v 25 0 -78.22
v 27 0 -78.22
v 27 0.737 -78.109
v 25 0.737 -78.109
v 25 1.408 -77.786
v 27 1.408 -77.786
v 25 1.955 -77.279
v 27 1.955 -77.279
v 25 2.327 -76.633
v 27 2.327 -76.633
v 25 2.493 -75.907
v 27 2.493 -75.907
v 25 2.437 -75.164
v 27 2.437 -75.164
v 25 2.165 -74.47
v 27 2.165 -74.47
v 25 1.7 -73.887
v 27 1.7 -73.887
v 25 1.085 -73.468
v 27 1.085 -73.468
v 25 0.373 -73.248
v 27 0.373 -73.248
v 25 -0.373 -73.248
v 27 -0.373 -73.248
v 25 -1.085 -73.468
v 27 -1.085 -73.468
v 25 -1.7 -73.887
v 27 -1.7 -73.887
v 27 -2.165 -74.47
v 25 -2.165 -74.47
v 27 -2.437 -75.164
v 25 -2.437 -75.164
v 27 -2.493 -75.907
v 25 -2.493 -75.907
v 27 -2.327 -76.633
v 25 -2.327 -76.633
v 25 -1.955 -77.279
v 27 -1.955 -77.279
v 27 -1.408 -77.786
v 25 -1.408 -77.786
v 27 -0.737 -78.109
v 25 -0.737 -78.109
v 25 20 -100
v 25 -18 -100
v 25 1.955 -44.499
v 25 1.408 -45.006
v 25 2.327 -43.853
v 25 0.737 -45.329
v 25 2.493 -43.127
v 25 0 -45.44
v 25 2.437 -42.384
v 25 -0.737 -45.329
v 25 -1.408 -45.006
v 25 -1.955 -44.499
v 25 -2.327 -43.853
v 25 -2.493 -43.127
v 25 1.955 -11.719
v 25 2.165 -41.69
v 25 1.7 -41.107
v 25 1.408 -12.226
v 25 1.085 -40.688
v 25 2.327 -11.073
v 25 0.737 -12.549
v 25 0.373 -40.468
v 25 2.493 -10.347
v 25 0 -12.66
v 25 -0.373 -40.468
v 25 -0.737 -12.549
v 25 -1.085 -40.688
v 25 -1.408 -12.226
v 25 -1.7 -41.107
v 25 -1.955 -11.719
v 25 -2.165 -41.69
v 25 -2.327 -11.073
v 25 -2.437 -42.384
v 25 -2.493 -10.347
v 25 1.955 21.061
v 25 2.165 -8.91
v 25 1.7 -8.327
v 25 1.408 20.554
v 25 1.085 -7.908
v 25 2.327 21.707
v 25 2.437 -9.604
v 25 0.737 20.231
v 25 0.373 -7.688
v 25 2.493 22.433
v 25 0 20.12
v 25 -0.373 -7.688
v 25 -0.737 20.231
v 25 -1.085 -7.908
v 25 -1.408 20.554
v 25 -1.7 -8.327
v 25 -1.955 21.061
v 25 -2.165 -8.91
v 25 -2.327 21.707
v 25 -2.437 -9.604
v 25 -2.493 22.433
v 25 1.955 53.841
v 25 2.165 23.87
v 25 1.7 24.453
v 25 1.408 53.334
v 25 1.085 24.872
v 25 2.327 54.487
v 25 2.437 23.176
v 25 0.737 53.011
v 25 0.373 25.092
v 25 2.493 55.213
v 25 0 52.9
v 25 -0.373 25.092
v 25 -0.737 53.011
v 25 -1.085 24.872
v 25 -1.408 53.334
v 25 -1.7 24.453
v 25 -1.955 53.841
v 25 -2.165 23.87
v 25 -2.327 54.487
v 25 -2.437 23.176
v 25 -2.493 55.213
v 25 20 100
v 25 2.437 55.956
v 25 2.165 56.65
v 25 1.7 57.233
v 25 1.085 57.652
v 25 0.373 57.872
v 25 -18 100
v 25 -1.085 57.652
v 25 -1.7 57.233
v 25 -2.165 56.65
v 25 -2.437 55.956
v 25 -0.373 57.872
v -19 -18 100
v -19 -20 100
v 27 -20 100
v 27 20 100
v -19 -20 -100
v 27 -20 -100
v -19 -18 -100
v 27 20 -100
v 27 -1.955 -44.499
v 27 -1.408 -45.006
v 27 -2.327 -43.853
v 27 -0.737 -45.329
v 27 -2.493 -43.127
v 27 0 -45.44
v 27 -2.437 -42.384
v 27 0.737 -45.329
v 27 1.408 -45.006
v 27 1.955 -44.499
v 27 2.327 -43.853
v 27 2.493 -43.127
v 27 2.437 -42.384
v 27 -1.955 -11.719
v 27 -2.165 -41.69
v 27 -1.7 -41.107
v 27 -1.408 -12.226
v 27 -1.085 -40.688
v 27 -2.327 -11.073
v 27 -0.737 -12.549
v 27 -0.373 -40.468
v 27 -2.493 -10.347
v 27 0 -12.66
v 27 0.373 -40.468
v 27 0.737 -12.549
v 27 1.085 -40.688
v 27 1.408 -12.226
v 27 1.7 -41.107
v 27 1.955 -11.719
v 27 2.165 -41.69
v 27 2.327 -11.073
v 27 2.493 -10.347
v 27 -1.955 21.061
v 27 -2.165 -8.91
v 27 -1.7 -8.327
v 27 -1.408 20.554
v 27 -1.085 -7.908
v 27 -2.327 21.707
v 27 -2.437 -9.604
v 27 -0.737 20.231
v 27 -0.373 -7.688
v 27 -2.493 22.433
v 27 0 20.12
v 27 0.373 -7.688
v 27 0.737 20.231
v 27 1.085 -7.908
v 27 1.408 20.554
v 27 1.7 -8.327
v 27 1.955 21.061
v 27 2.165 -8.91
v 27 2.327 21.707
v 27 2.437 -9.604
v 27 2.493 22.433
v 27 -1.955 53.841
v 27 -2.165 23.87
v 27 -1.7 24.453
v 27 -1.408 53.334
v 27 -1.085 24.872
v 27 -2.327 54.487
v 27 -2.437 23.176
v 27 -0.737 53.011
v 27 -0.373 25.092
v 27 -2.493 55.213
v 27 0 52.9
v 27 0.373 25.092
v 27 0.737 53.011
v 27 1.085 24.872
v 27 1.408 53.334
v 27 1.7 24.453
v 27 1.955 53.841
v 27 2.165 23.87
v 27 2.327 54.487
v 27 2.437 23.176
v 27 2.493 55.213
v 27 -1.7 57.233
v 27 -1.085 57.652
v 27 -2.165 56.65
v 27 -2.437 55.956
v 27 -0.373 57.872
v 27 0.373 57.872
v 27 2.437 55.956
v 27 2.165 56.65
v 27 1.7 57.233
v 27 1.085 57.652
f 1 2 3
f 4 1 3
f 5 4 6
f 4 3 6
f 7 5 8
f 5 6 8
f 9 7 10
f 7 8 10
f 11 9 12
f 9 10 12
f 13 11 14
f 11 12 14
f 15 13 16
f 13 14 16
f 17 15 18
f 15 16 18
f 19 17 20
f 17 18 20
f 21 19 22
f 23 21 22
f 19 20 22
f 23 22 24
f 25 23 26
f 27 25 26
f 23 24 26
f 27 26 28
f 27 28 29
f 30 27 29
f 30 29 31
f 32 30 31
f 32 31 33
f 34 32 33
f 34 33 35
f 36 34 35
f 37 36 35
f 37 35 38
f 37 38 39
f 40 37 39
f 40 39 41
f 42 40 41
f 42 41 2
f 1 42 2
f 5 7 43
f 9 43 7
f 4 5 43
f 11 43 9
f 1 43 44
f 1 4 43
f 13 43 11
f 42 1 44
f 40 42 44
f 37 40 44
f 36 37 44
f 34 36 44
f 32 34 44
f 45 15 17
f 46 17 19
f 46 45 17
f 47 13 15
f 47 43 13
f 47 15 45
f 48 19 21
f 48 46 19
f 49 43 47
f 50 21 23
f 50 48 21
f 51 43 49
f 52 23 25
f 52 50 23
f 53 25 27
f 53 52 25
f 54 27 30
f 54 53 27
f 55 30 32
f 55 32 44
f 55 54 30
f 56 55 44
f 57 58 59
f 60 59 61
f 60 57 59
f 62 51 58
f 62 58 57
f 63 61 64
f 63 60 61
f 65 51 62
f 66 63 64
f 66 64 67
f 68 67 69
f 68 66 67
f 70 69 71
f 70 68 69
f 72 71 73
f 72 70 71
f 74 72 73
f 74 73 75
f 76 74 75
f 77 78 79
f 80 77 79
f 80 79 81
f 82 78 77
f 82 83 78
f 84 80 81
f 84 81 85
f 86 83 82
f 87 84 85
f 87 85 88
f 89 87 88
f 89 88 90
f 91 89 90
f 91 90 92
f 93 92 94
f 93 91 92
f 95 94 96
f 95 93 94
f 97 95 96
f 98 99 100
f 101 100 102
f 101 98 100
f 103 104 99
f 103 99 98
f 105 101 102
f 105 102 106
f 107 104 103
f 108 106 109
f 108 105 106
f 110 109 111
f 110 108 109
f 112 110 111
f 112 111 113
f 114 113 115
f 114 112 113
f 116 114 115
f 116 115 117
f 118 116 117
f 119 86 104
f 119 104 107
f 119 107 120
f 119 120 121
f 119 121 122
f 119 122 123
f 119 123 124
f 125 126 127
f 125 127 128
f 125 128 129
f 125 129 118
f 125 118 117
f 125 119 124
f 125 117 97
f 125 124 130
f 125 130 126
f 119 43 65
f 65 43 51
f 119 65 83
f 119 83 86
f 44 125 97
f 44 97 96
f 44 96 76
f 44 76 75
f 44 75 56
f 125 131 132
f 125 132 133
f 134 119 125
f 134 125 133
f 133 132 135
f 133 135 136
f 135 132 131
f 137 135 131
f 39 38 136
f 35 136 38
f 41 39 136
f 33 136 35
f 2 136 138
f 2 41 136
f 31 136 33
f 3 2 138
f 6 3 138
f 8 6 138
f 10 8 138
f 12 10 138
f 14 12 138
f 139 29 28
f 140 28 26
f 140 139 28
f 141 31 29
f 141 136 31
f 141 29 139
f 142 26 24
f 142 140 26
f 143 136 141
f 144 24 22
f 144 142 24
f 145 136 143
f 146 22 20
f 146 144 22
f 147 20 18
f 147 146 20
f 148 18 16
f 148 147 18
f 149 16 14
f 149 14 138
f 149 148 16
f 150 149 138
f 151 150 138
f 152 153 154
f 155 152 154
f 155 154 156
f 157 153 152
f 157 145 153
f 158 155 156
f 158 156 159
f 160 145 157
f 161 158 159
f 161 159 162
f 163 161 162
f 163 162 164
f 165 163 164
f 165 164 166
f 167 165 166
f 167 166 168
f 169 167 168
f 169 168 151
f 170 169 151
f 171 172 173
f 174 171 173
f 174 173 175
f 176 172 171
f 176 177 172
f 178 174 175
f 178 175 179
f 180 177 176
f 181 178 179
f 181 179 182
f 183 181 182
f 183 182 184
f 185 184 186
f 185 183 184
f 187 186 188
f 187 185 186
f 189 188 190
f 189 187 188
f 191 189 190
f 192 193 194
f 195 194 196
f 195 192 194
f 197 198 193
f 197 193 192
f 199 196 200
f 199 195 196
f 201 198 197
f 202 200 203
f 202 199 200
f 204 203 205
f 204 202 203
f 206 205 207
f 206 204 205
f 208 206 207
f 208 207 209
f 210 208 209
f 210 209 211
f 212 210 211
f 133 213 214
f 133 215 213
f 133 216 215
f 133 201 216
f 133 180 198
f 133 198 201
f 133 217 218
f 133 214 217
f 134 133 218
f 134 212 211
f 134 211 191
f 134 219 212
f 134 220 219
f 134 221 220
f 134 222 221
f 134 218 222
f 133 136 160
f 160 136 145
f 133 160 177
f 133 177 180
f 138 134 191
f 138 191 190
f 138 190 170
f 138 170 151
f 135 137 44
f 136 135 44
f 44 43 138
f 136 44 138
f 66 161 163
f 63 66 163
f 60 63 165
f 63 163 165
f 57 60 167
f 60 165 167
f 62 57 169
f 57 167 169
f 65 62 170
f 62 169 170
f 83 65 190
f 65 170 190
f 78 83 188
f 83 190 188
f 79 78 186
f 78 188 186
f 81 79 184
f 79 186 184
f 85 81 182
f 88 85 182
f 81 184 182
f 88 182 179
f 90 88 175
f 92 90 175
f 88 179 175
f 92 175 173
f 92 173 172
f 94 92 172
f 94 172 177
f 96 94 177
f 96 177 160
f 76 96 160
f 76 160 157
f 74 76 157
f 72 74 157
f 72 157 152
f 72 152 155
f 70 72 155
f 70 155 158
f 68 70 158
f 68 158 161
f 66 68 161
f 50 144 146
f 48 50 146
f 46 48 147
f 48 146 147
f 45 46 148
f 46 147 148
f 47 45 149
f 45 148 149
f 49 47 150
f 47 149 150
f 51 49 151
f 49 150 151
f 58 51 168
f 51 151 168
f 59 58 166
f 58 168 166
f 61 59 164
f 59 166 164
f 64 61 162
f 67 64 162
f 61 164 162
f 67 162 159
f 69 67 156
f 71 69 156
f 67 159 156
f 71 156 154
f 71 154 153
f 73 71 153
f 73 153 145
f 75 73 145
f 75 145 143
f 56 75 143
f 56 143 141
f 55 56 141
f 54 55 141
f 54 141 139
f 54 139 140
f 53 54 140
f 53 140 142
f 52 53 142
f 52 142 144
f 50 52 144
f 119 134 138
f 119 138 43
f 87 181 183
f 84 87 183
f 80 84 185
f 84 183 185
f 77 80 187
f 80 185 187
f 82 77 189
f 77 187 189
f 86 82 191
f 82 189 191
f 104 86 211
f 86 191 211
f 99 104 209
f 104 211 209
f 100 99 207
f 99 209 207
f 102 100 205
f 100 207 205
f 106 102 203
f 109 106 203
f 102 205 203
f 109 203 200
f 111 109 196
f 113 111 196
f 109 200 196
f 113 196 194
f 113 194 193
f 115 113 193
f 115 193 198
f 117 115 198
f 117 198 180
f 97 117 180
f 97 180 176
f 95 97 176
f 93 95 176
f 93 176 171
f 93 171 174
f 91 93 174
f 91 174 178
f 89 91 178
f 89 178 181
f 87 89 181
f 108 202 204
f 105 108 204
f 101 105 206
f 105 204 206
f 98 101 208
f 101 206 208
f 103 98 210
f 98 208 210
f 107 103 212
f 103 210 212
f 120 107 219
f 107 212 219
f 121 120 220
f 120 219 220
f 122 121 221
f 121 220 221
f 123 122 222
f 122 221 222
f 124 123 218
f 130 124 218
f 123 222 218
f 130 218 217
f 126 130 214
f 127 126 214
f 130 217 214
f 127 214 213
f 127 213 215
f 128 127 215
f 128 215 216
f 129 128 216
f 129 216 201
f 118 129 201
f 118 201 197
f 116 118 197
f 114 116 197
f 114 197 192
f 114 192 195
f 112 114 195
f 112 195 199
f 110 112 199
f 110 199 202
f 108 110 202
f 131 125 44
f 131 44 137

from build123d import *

# Parameters (mm, degrees)
SALIENTE_EXTRUIR1_DEPTH = 100
CROQUIS2_R              = 2.5
CORTAR_EXTRUIR1_DEPTH   = 10
CROQUIS3_W              = 8
CROQUIS3_H              = 40
CORTAR_EXTRUIR2_DEPTH   = 201


with BuildPart() as part:
    # Croquis1 → Saliente-Extruir1 (new body, symmetric)
    with BuildSketch(Plane.XY):
        Polygon((-27, 20), (-27, -20), (27, -20), (27, 20), (25, 20), (25, -18), (-25, -18), (-25, 20), align=None)
    extrude(amount=SALIENTE_EXTRUIR1_DEPTH, both=True)

    # Croquis2 → Cortar-Extruir1 (cut)
    with BuildSketch(Plane(origin=(27, 0, 0), x_dir=(0, 0, -1), z_dir=(1, 0, 0))):
        with Locations((-55.4, 0)):
            Circle(CROQUIS2_R)
        with Locations((-22.62, 0)):
            Circle(CROQUIS2_R)
        with Locations((10.16, 0)):
            Circle(CROQUIS2_R)
        with Locations((42.94, 0)):
            Circle(CROQUIS2_R)
        with Locations((75.72, 0)):
            Circle(CROQUIS2_R)
    extrude(amount=-CORTAR_EXTRUIR1_DEPTH, mode=Mode.SUBTRACT)

    # Croquis3 → Cortar-Extruir2 (cut, through all)
    with BuildSketch(Plane.XY.offset(100)):
        with Locations((-23, 0)):
            Rectangle(CROQUIS3_W, CROQUIS3_H)
    extrude(amount=-CORTAR_EXTRUIR2_DEPTH, mode=Mode.SUBTRACT)


solid = part.part
